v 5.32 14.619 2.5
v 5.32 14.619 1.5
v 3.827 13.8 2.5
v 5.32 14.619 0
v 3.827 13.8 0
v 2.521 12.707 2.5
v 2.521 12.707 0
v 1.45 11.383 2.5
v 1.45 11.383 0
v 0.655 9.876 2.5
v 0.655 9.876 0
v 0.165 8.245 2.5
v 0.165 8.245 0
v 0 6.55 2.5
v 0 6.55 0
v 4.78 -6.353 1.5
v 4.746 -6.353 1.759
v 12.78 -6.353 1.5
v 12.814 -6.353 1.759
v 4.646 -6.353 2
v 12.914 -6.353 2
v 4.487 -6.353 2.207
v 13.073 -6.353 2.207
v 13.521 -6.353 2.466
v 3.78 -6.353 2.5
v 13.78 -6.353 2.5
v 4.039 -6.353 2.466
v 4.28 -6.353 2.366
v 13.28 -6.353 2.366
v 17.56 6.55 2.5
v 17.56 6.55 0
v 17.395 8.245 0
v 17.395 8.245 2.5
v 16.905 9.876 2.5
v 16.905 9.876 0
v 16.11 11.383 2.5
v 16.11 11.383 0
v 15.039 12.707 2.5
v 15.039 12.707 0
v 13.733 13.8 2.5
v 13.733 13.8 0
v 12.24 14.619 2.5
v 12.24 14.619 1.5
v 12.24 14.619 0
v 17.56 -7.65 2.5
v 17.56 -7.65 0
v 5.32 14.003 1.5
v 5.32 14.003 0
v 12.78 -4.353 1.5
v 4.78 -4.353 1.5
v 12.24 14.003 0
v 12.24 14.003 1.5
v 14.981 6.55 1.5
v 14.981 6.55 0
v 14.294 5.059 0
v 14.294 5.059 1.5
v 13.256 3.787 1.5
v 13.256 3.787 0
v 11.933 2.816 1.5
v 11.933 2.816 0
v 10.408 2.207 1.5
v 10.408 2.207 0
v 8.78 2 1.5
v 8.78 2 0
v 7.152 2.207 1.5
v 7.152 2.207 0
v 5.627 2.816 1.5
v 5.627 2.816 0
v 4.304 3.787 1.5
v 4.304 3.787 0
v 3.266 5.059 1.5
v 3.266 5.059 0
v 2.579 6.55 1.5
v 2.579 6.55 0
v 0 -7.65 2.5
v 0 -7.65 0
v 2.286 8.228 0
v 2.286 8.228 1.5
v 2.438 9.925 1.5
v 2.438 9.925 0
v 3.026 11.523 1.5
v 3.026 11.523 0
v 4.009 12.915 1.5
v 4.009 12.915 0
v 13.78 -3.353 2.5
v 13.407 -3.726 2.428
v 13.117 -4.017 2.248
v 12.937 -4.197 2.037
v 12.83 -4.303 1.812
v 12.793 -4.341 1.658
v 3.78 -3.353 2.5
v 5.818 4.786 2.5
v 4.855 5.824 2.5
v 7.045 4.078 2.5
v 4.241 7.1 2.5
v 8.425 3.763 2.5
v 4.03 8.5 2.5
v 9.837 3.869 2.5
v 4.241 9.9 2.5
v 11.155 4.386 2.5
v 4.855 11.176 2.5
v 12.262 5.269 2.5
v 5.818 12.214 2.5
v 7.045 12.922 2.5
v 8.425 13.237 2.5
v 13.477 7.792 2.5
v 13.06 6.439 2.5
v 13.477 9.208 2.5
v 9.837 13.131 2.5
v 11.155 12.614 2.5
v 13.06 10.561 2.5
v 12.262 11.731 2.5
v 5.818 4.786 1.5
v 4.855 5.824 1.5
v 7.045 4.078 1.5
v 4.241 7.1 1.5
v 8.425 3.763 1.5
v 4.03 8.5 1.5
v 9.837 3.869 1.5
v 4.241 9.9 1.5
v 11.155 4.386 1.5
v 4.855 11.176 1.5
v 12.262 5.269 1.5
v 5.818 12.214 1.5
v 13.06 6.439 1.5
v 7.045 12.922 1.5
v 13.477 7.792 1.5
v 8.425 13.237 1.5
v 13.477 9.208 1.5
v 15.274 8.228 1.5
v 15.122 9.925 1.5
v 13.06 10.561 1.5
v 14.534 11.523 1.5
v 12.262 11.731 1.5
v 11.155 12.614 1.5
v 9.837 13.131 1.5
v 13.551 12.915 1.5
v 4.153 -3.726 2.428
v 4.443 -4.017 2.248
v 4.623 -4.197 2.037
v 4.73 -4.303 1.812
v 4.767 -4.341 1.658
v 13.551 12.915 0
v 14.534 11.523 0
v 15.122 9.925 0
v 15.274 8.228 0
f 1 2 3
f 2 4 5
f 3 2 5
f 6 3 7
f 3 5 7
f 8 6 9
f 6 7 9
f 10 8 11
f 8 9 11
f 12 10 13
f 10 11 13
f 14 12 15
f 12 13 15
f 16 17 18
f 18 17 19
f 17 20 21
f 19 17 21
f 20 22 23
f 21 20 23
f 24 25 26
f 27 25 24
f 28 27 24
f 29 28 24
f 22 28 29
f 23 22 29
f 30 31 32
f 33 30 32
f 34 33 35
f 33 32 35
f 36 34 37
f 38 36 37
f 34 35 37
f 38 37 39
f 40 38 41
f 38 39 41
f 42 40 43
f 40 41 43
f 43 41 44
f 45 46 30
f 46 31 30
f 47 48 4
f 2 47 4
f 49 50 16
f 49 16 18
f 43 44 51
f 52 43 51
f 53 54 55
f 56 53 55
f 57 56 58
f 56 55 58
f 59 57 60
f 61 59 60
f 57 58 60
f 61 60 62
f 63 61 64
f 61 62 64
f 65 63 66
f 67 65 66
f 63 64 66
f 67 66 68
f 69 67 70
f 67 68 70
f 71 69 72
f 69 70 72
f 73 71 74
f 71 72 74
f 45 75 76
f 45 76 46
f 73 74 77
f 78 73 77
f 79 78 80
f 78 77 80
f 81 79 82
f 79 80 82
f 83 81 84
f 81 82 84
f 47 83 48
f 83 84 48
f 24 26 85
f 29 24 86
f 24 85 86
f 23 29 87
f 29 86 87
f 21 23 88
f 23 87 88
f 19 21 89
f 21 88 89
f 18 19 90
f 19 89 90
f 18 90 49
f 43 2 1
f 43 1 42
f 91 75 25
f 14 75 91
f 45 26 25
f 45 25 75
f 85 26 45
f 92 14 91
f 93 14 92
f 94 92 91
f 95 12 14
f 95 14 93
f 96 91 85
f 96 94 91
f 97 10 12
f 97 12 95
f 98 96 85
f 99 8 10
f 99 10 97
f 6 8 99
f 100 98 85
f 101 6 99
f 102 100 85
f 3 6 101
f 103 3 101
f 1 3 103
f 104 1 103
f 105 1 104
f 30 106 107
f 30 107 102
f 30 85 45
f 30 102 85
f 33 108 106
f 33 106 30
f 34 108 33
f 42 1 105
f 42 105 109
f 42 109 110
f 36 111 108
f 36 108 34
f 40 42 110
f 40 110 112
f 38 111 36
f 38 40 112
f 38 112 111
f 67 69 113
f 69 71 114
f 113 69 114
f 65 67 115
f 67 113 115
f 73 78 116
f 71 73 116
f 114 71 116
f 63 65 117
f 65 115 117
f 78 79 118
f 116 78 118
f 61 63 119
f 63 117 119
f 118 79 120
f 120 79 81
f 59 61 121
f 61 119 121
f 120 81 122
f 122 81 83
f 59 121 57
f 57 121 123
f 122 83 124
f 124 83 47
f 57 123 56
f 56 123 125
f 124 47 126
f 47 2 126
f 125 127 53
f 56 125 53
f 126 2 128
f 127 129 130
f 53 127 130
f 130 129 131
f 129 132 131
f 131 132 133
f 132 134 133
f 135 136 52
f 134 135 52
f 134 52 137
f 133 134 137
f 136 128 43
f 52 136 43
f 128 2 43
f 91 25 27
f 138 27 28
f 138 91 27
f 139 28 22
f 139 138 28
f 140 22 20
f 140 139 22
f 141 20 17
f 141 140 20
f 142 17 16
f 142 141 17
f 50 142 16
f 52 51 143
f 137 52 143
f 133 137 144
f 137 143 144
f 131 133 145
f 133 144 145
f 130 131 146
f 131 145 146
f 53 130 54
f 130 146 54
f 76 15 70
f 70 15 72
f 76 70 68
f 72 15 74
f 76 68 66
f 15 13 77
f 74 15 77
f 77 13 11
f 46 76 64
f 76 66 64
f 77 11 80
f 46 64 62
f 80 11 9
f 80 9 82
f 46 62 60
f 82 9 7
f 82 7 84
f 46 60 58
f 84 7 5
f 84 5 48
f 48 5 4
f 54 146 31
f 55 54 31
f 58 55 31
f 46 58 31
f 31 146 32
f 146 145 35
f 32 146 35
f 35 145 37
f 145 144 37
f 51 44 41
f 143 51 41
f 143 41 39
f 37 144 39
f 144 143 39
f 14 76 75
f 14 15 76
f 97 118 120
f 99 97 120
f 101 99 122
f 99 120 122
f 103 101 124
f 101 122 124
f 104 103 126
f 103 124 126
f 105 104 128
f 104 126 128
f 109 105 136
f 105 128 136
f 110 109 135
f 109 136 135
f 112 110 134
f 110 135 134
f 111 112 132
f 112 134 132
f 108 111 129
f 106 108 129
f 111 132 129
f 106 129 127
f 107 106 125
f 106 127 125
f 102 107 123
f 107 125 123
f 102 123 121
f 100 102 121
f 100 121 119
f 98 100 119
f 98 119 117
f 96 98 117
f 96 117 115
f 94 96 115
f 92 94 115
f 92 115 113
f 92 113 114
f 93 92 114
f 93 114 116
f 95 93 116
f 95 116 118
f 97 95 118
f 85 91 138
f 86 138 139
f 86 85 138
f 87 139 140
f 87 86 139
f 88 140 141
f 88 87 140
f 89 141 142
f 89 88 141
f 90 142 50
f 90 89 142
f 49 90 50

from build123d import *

# Parameters (mm, degrees)
BOSS_EXTRUDE1_DEPTH = 1.5
BOSS_EXTRUDE2_DEPTH = 1
SKETCH4_R           = 4.75
CUT_EXTRUDE1_DEPTH  = 23.898325822
SKETCH5_W           = 17.56
SKETCH5_H           = 2.5
BOSS_EXTRUDE3_DEPTH = 0.15
SKETCH6_W           = 17.56
SKETCH6_H           = 2.5
BOSS_EXTRUDE4_DEPTH = 7.5
SKETCH9_W           = 8
SKETCH9_H           = 2
CUT_EXTRUDE2_DEPTH  = 1
FILLET1_R           = 1


with BuildPart() as part:
    # Sketch1 → Boss-Extrude1 (new body)
    with BuildSketch(Plane.XY):
        with BuildLine():
            ThreePointArc((14.980604809, 6.55), (8.78, 2), (2.579395191, 6.55))
            Line((2.579395191, 6.55), (0, 6.55))
            Line((0, 6.55), (0, 0))
            Line((0, 0), (17.56, 0))
            Line((17.56, 0), (17.56, 6.55))
            Line((17.56, 6.55), (14.980604809, 6.55))
        make_face()
        with BuildLine():
            ThreePointArc((2.579395191, 6.55), (2.679421093, 10.743420825), (5.32, 14.002581212))
            Line((5.32, 14.002581212), (5.32, 14.619498126))
            ThreePointArc((5.32, 14.619498126), (1.449679407, 11.382680416), (0, 6.55))
            Line((0, 6.55), (2.579395191, 6.55))
        make_face()
        with BuildLine():
            ThreePointArc((12.24, 14.002581212), (14.880578907, 10.743420825), (14.980604809, 6.55))
            Line((14.980604809, 6.55), (17.56, 6.55))
            ThreePointArc((17.56, 6.55), (16.110320593, 11.382680416), (12.24, 14.619498126))
            Line((12.24, 14.619498126), (12.24, 14.002581212))
        make_face()
    extrude(amount=BOSS_EXTRUDE1_DEPTH)

    # Sketch3 → Boss-Extrude2 (add)
    with BuildSketch(Plane.XY.offset(1.5)):
        with BuildLine():
            Line((12.24, 14.619498126), (12.24, 14.002581212))
            ThreePointArc((12.24, 14.002581212), (8.78, 2), (5.32, 14.002581212))
            Line((5.32, 14.002581212), (5.32, 14.619498126))
            ThreePointArc((5.32, 14.619498126), (1.449679407, 11.382680416), (0, 6.55))
            Line((0, 6.55), (0, 0))
            Line((0, 0), (17.56, 0))
            Line((17.56, 0), (17.56, 6.55))
            ThreePointArc((17.56, 6.55), (16.110320593, 11.382680416), (12.24, 14.619498126))
        make_face()
        with BuildLine():
            Line((5.32, 14.619498126), (12.24, 14.619498126))
            Line((12.24, 14.619498126), (12.24, 14.002581212))
            ThreePointArc((12.24, 14.002581212), (8.78, 2), (5.32, 14.002581212))
            Line((5.32, 14.002581212), (5.32, 14.619498126))
        make_face()
    extrude(amount=BOSS_EXTRUDE2_DEPTH)

    # Sketch4 → Cut-Extrude1 (cut, through all)
    with BuildSketch(Plane(origin=(0, 0, 1.5), x_dir=(-1, 0, 0), z_dir=(0, 0, -1))):
        with Locations((-8.78, 8.5)):
            Circle(SKETCH4_R)
    extrude(amount=-CUT_EXTRUDE1_DEPTH, mode=Mode.SUBTRACT)

    # Sketch5 → Boss-Extrude3 (add)
    with BuildSketch(Plane.XZ):
        with Locations((8.78, 1.25)):
            Rectangle(SKETCH5_W, SKETCH5_H)
    extrude(amount=BOSS_EXTRUDE3_DEPTH)

    # Sketch6 → Boss-Extrude4 (add)
    with BuildSketch(Plane.XZ.offset(0.15)):
        with Locations((8.78, 1.25)):
            Rectangle(SKETCH6_W, SKETCH6_H)
    extrude(amount=BOSS_EXTRUDE4_DEPTH)

    # Sketch9 → Cut-Extrude2 (cut)
    with BuildSketch(Plane.XY.offset(2.5)):
        with Locations((8.78, -5.353166831)):
            Rectangle(SKETCH9_W, SKETCH9_H)
    extrude(amount=-CUT_EXTRUDE2_DEPTH, mode=Mode.SUBTRACT)

    # Fillet1
    fillet1_edges = [part.edges().sort_by_distance(p)[0] for p in [
        (4.78, -5.353166831, 2.5),
        (12.78, -5.353166831, 2.5),
        (8.78, -4.353166831, 2.5),
    ]]
    fillet(fillet1_edges, radius=FILLET1_R - 0.0001)  # a hair under: the kernel refuses the full size


solid = part.part
